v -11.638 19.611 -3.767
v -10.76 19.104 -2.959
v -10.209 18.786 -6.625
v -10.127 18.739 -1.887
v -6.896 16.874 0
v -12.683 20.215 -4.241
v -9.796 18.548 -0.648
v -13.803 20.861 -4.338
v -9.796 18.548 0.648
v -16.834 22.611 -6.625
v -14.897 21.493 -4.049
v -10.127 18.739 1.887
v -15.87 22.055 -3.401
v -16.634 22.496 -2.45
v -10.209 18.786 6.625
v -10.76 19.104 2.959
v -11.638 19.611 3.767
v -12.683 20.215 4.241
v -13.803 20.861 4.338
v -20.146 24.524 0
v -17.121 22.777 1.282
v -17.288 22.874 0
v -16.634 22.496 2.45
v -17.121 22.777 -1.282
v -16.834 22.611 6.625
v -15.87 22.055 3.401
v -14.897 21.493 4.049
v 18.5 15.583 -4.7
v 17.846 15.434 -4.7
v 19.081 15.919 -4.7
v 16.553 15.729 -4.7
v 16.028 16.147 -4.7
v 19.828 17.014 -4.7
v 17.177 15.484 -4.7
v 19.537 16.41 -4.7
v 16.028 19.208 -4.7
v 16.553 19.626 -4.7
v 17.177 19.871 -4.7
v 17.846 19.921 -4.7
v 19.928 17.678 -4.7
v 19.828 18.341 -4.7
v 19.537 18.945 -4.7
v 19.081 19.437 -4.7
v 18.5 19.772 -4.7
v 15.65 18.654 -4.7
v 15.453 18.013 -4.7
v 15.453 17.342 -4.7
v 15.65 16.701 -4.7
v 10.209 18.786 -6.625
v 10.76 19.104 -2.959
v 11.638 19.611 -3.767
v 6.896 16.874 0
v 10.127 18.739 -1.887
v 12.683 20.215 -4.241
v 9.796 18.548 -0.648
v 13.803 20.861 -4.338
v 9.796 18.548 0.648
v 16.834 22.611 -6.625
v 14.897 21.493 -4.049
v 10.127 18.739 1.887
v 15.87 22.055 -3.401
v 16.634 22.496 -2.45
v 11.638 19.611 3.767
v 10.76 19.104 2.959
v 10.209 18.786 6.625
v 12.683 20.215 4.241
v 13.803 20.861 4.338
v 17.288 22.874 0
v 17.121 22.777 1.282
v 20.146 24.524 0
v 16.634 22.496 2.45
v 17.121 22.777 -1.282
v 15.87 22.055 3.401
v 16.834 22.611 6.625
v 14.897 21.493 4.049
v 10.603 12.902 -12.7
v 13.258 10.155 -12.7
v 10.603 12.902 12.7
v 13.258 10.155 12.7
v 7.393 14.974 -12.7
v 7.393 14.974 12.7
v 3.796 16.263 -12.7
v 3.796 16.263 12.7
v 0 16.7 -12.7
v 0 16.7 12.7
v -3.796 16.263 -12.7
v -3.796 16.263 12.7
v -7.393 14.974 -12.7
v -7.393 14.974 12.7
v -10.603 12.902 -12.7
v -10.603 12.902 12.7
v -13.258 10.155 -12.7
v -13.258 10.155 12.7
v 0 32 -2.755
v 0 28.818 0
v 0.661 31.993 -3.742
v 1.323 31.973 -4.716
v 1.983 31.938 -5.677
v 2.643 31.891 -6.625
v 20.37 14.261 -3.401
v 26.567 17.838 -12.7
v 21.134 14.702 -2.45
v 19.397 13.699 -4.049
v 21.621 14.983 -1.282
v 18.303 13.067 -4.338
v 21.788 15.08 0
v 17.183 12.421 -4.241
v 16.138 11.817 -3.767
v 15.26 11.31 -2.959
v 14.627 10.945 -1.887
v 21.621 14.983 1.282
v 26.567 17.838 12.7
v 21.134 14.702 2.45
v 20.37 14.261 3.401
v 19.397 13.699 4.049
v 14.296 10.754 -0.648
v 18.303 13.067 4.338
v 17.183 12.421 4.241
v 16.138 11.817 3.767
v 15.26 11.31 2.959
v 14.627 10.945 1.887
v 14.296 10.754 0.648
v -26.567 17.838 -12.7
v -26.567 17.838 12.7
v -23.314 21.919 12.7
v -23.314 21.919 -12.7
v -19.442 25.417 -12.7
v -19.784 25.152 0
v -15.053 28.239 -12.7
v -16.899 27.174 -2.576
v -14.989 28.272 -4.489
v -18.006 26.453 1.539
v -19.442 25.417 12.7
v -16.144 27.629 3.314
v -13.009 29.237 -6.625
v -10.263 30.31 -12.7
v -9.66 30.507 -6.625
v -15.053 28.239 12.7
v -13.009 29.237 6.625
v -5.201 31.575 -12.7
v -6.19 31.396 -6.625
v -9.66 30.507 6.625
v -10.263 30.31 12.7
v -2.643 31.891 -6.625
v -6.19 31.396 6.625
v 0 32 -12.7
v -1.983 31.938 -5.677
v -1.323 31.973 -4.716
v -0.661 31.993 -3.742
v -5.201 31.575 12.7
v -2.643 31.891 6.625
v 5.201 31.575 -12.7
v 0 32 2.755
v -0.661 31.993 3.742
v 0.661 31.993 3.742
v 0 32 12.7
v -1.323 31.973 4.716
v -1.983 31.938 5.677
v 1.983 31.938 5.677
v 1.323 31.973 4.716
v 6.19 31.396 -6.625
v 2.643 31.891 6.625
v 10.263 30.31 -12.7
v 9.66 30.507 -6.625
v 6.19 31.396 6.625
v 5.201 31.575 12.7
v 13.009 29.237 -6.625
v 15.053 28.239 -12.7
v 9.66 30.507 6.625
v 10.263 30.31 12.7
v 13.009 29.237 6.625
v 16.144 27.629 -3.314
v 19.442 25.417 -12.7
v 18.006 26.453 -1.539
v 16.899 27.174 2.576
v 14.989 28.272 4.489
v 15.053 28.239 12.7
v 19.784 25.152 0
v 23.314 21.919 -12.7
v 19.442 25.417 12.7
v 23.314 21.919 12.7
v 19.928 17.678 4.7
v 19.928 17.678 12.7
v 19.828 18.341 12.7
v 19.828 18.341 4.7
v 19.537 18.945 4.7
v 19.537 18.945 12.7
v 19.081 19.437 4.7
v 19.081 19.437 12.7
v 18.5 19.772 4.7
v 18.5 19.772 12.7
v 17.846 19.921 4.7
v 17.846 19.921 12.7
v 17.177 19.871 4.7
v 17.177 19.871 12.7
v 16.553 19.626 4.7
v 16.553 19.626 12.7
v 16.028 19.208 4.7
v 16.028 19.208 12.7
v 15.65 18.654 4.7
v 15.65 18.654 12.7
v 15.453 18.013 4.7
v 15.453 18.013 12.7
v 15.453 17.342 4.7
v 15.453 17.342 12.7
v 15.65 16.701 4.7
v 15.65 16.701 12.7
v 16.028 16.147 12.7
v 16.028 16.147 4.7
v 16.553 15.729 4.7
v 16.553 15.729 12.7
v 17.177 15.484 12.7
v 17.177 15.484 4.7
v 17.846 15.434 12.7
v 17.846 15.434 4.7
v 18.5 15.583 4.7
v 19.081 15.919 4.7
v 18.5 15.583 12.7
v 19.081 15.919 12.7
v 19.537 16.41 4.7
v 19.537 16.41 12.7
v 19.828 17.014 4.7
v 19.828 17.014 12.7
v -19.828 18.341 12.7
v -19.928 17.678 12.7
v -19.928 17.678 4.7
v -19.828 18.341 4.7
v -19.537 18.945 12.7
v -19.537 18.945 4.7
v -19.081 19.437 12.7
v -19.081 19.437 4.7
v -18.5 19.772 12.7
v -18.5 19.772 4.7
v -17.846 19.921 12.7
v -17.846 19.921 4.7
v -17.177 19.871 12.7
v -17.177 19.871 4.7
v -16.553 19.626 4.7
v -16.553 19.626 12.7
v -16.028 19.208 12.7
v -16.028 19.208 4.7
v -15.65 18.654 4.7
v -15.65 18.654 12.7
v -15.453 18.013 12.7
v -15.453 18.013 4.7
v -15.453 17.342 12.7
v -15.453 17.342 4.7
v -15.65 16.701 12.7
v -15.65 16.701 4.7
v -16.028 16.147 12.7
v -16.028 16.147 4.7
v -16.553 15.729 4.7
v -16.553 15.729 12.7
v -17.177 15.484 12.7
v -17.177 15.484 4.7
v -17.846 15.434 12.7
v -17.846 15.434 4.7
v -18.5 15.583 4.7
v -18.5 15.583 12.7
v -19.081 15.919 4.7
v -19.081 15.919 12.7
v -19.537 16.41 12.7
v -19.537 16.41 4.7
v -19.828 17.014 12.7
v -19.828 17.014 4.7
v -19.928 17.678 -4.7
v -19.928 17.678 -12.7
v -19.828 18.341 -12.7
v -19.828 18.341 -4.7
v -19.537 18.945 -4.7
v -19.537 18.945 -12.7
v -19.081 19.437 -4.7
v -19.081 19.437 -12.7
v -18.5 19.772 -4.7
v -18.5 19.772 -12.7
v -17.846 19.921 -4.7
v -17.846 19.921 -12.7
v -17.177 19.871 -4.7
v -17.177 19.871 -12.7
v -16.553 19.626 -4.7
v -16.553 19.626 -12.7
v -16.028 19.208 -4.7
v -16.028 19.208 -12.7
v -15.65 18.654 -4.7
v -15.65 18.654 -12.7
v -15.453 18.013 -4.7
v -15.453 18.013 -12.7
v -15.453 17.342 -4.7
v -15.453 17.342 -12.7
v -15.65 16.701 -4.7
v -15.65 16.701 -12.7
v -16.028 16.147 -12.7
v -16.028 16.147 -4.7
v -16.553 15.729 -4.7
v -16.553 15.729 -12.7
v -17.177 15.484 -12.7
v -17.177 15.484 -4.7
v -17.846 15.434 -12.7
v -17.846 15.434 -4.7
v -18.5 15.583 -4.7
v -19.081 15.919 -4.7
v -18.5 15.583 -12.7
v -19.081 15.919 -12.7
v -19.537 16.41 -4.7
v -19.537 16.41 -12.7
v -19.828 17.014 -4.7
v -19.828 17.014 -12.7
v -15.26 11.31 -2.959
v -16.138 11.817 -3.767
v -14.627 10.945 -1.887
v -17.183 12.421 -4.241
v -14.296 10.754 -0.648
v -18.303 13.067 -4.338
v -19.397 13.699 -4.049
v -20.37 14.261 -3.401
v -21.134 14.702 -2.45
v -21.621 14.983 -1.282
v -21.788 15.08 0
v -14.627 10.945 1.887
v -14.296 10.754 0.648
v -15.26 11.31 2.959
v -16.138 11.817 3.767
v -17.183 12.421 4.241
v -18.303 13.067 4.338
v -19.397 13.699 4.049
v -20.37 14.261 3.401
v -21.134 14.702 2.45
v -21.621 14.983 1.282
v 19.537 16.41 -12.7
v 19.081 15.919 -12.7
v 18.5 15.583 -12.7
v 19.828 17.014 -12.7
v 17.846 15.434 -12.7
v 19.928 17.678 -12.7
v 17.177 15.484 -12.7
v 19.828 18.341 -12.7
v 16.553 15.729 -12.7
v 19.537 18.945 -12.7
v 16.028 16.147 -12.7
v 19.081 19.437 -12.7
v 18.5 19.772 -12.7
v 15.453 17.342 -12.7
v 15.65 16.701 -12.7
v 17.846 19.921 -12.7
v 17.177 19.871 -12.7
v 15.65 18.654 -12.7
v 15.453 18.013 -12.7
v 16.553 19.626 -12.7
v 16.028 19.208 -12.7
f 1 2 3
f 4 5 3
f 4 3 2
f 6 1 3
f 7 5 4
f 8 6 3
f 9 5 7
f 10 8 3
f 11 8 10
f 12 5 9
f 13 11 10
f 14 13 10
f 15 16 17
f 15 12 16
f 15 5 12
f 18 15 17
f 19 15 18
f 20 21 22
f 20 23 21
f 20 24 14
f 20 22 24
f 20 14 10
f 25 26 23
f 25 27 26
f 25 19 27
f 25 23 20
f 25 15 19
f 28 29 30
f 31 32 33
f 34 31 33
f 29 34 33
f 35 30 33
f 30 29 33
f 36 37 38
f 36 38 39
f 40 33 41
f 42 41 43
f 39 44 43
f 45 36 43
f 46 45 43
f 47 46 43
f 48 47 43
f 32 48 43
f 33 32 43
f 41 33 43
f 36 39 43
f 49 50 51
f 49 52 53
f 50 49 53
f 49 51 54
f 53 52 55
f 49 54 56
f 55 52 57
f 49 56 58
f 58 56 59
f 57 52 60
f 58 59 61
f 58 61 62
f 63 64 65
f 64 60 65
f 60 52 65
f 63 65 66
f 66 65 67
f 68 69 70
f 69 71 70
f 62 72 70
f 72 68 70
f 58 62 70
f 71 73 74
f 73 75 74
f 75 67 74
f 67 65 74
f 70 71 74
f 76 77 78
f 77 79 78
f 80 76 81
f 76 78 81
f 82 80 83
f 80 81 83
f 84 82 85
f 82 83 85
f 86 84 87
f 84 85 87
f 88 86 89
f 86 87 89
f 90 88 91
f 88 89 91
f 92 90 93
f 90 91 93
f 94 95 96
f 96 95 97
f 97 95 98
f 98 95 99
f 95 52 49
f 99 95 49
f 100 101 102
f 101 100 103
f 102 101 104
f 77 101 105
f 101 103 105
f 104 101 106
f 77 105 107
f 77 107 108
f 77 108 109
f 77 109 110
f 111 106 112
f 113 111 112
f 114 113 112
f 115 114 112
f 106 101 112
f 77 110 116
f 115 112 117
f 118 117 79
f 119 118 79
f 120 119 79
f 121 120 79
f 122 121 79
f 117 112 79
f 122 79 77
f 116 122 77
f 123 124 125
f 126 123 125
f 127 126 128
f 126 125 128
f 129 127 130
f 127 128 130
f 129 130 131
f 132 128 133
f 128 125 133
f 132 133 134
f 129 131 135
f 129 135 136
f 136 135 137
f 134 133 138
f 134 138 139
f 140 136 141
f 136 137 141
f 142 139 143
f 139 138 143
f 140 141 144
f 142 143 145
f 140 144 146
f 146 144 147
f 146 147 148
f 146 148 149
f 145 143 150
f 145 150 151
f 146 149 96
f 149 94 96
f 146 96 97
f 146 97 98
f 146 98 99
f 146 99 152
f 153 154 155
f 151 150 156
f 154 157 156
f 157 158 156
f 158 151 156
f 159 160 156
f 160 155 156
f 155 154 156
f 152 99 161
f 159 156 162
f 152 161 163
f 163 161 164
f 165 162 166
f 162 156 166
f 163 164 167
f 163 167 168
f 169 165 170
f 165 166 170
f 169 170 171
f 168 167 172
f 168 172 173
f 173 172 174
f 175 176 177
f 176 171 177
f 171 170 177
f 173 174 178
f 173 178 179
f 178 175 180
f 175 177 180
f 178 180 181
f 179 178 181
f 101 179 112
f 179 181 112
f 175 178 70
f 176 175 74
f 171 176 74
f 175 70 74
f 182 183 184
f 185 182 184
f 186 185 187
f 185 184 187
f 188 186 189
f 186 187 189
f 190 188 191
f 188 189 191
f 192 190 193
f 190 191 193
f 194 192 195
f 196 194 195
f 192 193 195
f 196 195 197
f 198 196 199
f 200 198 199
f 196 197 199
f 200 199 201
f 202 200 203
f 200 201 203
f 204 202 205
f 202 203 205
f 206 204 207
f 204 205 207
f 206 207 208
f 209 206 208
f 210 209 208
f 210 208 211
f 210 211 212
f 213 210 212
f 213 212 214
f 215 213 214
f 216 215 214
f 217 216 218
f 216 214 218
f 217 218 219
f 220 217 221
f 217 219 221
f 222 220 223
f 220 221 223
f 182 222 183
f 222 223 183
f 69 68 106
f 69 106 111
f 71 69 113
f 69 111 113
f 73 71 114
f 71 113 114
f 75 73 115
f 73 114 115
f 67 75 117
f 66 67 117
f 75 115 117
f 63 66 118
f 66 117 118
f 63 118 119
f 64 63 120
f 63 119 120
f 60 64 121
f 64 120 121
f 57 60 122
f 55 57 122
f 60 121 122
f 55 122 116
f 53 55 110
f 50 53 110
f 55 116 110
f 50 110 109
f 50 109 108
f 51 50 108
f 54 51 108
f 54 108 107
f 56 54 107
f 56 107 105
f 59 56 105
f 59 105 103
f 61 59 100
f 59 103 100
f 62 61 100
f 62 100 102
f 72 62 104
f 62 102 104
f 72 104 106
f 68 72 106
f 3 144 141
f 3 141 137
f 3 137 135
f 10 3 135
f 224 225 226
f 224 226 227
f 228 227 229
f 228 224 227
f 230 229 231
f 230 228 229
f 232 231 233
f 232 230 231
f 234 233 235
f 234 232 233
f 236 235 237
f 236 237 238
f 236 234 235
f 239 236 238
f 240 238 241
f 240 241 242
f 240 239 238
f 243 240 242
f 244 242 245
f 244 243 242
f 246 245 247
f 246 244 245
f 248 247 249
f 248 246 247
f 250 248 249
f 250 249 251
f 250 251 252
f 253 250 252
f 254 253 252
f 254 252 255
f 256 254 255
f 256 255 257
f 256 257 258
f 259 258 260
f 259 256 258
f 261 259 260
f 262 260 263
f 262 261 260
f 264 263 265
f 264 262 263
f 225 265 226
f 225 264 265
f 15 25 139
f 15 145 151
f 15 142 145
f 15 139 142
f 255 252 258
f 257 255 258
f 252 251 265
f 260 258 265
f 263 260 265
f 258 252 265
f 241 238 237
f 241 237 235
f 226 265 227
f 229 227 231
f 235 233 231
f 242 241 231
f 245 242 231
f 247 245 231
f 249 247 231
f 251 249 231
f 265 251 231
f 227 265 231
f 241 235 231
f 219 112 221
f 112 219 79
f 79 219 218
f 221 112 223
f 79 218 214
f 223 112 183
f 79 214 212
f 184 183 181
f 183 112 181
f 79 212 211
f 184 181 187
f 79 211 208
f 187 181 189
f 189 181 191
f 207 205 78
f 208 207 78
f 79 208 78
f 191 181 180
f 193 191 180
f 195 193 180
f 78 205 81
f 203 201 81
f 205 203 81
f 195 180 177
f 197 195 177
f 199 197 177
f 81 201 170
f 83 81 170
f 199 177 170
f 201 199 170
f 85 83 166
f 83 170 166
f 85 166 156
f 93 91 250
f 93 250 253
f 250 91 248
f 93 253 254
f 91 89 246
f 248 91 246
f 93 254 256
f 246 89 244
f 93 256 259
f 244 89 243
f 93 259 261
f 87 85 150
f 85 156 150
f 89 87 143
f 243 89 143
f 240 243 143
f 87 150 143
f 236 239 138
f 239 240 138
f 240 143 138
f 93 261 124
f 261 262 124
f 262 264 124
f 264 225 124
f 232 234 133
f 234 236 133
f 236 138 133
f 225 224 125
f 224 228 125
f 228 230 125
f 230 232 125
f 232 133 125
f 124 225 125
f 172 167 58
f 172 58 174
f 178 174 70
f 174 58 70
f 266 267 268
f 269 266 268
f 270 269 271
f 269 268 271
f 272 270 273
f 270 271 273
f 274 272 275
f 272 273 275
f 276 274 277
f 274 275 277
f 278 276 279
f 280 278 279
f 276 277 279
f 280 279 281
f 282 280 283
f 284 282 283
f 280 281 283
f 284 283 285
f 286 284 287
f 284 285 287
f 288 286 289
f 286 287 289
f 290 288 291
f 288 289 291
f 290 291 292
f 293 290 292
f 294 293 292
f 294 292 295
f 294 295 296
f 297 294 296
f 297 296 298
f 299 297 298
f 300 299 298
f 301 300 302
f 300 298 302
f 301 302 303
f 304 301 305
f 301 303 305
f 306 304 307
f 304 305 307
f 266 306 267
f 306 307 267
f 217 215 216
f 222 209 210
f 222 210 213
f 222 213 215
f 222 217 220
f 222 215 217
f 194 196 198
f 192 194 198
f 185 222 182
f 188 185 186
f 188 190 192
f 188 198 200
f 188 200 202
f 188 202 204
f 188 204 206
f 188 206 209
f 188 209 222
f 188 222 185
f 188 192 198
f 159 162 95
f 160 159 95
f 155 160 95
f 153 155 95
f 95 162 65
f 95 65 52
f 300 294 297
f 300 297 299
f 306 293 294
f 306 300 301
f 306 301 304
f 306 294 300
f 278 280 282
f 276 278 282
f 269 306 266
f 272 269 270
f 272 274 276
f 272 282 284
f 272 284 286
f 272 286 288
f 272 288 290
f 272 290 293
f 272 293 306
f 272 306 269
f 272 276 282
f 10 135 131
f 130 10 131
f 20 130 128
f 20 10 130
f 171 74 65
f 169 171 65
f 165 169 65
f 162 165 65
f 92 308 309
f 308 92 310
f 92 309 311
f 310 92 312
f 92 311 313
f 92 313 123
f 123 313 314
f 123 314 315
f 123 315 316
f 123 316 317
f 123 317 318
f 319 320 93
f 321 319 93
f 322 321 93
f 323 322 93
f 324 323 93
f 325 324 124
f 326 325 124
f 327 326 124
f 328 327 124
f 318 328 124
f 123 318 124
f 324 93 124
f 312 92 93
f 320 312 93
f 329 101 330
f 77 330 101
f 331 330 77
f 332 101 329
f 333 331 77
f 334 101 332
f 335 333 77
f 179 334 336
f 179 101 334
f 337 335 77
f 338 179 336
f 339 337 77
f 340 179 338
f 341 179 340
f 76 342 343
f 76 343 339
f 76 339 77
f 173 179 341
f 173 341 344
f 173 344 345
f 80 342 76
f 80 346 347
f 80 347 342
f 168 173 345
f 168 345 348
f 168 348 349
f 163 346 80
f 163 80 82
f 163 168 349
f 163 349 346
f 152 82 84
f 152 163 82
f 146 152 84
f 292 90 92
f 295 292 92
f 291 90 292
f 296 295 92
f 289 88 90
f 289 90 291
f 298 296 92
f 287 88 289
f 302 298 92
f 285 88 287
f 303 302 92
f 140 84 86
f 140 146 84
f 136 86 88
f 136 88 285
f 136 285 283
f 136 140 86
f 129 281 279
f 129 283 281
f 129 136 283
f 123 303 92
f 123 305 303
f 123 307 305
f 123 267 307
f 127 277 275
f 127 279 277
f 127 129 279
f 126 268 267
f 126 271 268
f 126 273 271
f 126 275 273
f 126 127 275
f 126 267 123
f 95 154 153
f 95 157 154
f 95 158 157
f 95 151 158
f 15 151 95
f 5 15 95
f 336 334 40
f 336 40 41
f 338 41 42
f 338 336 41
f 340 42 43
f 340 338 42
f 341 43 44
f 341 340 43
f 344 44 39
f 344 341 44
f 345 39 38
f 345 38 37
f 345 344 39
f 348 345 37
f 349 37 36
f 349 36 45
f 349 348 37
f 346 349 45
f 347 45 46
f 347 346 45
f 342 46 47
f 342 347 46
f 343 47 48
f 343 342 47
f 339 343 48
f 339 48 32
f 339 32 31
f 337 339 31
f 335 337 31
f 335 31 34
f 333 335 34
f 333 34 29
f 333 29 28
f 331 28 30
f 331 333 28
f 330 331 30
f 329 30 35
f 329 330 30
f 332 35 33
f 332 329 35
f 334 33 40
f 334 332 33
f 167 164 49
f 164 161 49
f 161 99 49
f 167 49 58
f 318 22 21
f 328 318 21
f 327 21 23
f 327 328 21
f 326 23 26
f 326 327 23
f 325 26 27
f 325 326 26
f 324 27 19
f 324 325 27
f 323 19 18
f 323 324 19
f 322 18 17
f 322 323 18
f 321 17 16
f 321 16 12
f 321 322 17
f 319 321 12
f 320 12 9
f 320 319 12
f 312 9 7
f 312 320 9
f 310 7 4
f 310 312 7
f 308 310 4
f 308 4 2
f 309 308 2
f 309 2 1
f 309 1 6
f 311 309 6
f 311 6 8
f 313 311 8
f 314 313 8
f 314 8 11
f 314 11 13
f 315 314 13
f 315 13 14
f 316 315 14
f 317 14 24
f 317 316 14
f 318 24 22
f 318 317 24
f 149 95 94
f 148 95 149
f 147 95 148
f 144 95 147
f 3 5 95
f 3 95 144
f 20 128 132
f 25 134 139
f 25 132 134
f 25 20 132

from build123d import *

# Parameters (mm, degrees)
SKETCH1_R           = 2.25
BOSS_EXTRUDE1_DEPTH = 12.7
SKETCH3_R           = 4.35
CUT_EXTRUDE1_DEPTH  = 43.816935902
CUT_EXTRUDE2_START  = 12.7
SKETCH1_3_R         = 2.25
CUT_EXTRUDE2_DEPTH  = 8
CUT_EXTRUDE4_START  = -12.7
SKETCH1_5_R         = 2.25
CUT_EXTRUDE4_DEPTH  = 8
CUT_EXTRUDE3_START  = -9
SKETCH3_3_R         = 4.35
CUT_EXTRUDE3_DEPTH  = 34.816936066


with BuildPart() as part:
    # Sketch1 → Boss-Extrude1 (new, symmetric)
    with BuildSketch(Plane.XY):
        with BuildLine():
            ThreePointArc((-26.566778815, 17.838336901), (0, 32), (26.566778815, 17.838336901))
            Line((26.566778815, 17.838336901), (13.258035703, 10.154530482))
            ThreePointArc((13.258035703, 10.154530482), (0, 16.7), (-13.258035703, 10.154530482))
            Line((-13.258035703, 10.154530482), (-26.566778815, 17.838336901))
        make_face()
        with Locations((17.67766953, 17.67766953)):
            Circle(SKETCH1_R, mode=Mode.SUBTRACT)
        with Locations((-17.67766953, 17.67766953)):
            Circle(SKETCH1_R, mode=Mode.SUBTRACT)
        with Locations((-17.67766953, 17.67766953)):
            Circle(SKETCH1_R)
        with Locations((17.67766953, 17.67766953)):
            Circle(SKETCH1_R)
    extrude(amount=BOSS_EXTRUDE1_DEPTH, both=True)

    # Sketch3 → Cut-Extrude1 (cut, symmetric)
    with BuildSketch(Plane(origin=(-1.082531755, 1.875, 0), x_dir=(0.8660254037844398, 0.4999999999999983, 0), z_dir=(0.4999999999999983, -0.8660254037844398, 0))):
        with Locations((22.059060964, 0)):
            Circle(SKETCH3_R)
    cut_extrude1 = extrude(amount=CUT_EXTRUDE1_DEPTH, both=True, mode=Mode.SUBTRACT)

    # Sketch1<3> → Cut-Extrude2 (cut)
    with BuildSketch(Plane.XY.offset(CUT_EXTRUDE2_START)):
        with Locations((17.67766953, 17.67766953)):
            Circle(SKETCH1_3_R)
    cut_extrude2 = extrude(amount=-CUT_EXTRUDE2_DEPTH, mode=Mode.SUBTRACT)

    # Sketch1<5> → Cut-Extrude4 (cut)
    with BuildSketch(Plane.XY.offset(CUT_EXTRUDE4_START)):
        with Locations((17.67766953, 17.67766953)):
            Circle(SKETCH1_5_R)
    cut_extrude4 = extrude(amount=CUT_EXTRUDE4_DEPTH, mode=Mode.SUBTRACT)

    # Sketch3<3> → Cut-Extrude3 (cut, through all)
    with BuildSketch(Plane(origin=(-1.082531755, 1.875, 0), x_dir=(0.8660254037844398, 0.4999999999999983, 0), z_dir=(0.4999999999999983, -0.8660254037844398, 0)).offset(CUT_EXTRUDE3_START)):
        Polygon((18.23411543, -6.625), (25.884006497, -6.625), (29.70895203, 0), (25.884006497, 6.625), (18.23411543, 6.625), (14.409169897, 0), align=None)
        with Locations((22.059060964, 0)):
            Circle(SKETCH3_3_R, mode=Mode.SUBTRACT)
    cut_extrude3 = extrude(amount=-CUT_EXTRUDE3_DEPTH, mode=Mode.SUBTRACT)

    # Mirror1: Cut-Extrude1, Cut-Extrude2, Cut-Extrude4, Cut-Extrude3 across plane
    add(cut_extrude1.mirror(Plane(origin=(0, 0, 0), x_dir=(0, 0, 1), z_dir=(1, 0, 0))), mode=Mode.SUBTRACT)
    add(cut_extrude2.mirror(Plane(origin=(0, 0, 0), x_dir=(0, 0, 1), z_dir=(1, 0, 0))), mode=Mode.SUBTRACT)
    add(cut_extrude4.mirror(Plane(origin=(0, 0, 0), x_dir=(0, 0, 1), z_dir=(1, 0, 0))), mode=Mode.SUBTRACT)
    add(cut_extrude3.mirror(Plane(origin=(0, 0, 0), x_dir=(0, 0, 1), z_dir=(1, 0, 0))), mode=Mode.SUBTRACT)


solid = part.part
